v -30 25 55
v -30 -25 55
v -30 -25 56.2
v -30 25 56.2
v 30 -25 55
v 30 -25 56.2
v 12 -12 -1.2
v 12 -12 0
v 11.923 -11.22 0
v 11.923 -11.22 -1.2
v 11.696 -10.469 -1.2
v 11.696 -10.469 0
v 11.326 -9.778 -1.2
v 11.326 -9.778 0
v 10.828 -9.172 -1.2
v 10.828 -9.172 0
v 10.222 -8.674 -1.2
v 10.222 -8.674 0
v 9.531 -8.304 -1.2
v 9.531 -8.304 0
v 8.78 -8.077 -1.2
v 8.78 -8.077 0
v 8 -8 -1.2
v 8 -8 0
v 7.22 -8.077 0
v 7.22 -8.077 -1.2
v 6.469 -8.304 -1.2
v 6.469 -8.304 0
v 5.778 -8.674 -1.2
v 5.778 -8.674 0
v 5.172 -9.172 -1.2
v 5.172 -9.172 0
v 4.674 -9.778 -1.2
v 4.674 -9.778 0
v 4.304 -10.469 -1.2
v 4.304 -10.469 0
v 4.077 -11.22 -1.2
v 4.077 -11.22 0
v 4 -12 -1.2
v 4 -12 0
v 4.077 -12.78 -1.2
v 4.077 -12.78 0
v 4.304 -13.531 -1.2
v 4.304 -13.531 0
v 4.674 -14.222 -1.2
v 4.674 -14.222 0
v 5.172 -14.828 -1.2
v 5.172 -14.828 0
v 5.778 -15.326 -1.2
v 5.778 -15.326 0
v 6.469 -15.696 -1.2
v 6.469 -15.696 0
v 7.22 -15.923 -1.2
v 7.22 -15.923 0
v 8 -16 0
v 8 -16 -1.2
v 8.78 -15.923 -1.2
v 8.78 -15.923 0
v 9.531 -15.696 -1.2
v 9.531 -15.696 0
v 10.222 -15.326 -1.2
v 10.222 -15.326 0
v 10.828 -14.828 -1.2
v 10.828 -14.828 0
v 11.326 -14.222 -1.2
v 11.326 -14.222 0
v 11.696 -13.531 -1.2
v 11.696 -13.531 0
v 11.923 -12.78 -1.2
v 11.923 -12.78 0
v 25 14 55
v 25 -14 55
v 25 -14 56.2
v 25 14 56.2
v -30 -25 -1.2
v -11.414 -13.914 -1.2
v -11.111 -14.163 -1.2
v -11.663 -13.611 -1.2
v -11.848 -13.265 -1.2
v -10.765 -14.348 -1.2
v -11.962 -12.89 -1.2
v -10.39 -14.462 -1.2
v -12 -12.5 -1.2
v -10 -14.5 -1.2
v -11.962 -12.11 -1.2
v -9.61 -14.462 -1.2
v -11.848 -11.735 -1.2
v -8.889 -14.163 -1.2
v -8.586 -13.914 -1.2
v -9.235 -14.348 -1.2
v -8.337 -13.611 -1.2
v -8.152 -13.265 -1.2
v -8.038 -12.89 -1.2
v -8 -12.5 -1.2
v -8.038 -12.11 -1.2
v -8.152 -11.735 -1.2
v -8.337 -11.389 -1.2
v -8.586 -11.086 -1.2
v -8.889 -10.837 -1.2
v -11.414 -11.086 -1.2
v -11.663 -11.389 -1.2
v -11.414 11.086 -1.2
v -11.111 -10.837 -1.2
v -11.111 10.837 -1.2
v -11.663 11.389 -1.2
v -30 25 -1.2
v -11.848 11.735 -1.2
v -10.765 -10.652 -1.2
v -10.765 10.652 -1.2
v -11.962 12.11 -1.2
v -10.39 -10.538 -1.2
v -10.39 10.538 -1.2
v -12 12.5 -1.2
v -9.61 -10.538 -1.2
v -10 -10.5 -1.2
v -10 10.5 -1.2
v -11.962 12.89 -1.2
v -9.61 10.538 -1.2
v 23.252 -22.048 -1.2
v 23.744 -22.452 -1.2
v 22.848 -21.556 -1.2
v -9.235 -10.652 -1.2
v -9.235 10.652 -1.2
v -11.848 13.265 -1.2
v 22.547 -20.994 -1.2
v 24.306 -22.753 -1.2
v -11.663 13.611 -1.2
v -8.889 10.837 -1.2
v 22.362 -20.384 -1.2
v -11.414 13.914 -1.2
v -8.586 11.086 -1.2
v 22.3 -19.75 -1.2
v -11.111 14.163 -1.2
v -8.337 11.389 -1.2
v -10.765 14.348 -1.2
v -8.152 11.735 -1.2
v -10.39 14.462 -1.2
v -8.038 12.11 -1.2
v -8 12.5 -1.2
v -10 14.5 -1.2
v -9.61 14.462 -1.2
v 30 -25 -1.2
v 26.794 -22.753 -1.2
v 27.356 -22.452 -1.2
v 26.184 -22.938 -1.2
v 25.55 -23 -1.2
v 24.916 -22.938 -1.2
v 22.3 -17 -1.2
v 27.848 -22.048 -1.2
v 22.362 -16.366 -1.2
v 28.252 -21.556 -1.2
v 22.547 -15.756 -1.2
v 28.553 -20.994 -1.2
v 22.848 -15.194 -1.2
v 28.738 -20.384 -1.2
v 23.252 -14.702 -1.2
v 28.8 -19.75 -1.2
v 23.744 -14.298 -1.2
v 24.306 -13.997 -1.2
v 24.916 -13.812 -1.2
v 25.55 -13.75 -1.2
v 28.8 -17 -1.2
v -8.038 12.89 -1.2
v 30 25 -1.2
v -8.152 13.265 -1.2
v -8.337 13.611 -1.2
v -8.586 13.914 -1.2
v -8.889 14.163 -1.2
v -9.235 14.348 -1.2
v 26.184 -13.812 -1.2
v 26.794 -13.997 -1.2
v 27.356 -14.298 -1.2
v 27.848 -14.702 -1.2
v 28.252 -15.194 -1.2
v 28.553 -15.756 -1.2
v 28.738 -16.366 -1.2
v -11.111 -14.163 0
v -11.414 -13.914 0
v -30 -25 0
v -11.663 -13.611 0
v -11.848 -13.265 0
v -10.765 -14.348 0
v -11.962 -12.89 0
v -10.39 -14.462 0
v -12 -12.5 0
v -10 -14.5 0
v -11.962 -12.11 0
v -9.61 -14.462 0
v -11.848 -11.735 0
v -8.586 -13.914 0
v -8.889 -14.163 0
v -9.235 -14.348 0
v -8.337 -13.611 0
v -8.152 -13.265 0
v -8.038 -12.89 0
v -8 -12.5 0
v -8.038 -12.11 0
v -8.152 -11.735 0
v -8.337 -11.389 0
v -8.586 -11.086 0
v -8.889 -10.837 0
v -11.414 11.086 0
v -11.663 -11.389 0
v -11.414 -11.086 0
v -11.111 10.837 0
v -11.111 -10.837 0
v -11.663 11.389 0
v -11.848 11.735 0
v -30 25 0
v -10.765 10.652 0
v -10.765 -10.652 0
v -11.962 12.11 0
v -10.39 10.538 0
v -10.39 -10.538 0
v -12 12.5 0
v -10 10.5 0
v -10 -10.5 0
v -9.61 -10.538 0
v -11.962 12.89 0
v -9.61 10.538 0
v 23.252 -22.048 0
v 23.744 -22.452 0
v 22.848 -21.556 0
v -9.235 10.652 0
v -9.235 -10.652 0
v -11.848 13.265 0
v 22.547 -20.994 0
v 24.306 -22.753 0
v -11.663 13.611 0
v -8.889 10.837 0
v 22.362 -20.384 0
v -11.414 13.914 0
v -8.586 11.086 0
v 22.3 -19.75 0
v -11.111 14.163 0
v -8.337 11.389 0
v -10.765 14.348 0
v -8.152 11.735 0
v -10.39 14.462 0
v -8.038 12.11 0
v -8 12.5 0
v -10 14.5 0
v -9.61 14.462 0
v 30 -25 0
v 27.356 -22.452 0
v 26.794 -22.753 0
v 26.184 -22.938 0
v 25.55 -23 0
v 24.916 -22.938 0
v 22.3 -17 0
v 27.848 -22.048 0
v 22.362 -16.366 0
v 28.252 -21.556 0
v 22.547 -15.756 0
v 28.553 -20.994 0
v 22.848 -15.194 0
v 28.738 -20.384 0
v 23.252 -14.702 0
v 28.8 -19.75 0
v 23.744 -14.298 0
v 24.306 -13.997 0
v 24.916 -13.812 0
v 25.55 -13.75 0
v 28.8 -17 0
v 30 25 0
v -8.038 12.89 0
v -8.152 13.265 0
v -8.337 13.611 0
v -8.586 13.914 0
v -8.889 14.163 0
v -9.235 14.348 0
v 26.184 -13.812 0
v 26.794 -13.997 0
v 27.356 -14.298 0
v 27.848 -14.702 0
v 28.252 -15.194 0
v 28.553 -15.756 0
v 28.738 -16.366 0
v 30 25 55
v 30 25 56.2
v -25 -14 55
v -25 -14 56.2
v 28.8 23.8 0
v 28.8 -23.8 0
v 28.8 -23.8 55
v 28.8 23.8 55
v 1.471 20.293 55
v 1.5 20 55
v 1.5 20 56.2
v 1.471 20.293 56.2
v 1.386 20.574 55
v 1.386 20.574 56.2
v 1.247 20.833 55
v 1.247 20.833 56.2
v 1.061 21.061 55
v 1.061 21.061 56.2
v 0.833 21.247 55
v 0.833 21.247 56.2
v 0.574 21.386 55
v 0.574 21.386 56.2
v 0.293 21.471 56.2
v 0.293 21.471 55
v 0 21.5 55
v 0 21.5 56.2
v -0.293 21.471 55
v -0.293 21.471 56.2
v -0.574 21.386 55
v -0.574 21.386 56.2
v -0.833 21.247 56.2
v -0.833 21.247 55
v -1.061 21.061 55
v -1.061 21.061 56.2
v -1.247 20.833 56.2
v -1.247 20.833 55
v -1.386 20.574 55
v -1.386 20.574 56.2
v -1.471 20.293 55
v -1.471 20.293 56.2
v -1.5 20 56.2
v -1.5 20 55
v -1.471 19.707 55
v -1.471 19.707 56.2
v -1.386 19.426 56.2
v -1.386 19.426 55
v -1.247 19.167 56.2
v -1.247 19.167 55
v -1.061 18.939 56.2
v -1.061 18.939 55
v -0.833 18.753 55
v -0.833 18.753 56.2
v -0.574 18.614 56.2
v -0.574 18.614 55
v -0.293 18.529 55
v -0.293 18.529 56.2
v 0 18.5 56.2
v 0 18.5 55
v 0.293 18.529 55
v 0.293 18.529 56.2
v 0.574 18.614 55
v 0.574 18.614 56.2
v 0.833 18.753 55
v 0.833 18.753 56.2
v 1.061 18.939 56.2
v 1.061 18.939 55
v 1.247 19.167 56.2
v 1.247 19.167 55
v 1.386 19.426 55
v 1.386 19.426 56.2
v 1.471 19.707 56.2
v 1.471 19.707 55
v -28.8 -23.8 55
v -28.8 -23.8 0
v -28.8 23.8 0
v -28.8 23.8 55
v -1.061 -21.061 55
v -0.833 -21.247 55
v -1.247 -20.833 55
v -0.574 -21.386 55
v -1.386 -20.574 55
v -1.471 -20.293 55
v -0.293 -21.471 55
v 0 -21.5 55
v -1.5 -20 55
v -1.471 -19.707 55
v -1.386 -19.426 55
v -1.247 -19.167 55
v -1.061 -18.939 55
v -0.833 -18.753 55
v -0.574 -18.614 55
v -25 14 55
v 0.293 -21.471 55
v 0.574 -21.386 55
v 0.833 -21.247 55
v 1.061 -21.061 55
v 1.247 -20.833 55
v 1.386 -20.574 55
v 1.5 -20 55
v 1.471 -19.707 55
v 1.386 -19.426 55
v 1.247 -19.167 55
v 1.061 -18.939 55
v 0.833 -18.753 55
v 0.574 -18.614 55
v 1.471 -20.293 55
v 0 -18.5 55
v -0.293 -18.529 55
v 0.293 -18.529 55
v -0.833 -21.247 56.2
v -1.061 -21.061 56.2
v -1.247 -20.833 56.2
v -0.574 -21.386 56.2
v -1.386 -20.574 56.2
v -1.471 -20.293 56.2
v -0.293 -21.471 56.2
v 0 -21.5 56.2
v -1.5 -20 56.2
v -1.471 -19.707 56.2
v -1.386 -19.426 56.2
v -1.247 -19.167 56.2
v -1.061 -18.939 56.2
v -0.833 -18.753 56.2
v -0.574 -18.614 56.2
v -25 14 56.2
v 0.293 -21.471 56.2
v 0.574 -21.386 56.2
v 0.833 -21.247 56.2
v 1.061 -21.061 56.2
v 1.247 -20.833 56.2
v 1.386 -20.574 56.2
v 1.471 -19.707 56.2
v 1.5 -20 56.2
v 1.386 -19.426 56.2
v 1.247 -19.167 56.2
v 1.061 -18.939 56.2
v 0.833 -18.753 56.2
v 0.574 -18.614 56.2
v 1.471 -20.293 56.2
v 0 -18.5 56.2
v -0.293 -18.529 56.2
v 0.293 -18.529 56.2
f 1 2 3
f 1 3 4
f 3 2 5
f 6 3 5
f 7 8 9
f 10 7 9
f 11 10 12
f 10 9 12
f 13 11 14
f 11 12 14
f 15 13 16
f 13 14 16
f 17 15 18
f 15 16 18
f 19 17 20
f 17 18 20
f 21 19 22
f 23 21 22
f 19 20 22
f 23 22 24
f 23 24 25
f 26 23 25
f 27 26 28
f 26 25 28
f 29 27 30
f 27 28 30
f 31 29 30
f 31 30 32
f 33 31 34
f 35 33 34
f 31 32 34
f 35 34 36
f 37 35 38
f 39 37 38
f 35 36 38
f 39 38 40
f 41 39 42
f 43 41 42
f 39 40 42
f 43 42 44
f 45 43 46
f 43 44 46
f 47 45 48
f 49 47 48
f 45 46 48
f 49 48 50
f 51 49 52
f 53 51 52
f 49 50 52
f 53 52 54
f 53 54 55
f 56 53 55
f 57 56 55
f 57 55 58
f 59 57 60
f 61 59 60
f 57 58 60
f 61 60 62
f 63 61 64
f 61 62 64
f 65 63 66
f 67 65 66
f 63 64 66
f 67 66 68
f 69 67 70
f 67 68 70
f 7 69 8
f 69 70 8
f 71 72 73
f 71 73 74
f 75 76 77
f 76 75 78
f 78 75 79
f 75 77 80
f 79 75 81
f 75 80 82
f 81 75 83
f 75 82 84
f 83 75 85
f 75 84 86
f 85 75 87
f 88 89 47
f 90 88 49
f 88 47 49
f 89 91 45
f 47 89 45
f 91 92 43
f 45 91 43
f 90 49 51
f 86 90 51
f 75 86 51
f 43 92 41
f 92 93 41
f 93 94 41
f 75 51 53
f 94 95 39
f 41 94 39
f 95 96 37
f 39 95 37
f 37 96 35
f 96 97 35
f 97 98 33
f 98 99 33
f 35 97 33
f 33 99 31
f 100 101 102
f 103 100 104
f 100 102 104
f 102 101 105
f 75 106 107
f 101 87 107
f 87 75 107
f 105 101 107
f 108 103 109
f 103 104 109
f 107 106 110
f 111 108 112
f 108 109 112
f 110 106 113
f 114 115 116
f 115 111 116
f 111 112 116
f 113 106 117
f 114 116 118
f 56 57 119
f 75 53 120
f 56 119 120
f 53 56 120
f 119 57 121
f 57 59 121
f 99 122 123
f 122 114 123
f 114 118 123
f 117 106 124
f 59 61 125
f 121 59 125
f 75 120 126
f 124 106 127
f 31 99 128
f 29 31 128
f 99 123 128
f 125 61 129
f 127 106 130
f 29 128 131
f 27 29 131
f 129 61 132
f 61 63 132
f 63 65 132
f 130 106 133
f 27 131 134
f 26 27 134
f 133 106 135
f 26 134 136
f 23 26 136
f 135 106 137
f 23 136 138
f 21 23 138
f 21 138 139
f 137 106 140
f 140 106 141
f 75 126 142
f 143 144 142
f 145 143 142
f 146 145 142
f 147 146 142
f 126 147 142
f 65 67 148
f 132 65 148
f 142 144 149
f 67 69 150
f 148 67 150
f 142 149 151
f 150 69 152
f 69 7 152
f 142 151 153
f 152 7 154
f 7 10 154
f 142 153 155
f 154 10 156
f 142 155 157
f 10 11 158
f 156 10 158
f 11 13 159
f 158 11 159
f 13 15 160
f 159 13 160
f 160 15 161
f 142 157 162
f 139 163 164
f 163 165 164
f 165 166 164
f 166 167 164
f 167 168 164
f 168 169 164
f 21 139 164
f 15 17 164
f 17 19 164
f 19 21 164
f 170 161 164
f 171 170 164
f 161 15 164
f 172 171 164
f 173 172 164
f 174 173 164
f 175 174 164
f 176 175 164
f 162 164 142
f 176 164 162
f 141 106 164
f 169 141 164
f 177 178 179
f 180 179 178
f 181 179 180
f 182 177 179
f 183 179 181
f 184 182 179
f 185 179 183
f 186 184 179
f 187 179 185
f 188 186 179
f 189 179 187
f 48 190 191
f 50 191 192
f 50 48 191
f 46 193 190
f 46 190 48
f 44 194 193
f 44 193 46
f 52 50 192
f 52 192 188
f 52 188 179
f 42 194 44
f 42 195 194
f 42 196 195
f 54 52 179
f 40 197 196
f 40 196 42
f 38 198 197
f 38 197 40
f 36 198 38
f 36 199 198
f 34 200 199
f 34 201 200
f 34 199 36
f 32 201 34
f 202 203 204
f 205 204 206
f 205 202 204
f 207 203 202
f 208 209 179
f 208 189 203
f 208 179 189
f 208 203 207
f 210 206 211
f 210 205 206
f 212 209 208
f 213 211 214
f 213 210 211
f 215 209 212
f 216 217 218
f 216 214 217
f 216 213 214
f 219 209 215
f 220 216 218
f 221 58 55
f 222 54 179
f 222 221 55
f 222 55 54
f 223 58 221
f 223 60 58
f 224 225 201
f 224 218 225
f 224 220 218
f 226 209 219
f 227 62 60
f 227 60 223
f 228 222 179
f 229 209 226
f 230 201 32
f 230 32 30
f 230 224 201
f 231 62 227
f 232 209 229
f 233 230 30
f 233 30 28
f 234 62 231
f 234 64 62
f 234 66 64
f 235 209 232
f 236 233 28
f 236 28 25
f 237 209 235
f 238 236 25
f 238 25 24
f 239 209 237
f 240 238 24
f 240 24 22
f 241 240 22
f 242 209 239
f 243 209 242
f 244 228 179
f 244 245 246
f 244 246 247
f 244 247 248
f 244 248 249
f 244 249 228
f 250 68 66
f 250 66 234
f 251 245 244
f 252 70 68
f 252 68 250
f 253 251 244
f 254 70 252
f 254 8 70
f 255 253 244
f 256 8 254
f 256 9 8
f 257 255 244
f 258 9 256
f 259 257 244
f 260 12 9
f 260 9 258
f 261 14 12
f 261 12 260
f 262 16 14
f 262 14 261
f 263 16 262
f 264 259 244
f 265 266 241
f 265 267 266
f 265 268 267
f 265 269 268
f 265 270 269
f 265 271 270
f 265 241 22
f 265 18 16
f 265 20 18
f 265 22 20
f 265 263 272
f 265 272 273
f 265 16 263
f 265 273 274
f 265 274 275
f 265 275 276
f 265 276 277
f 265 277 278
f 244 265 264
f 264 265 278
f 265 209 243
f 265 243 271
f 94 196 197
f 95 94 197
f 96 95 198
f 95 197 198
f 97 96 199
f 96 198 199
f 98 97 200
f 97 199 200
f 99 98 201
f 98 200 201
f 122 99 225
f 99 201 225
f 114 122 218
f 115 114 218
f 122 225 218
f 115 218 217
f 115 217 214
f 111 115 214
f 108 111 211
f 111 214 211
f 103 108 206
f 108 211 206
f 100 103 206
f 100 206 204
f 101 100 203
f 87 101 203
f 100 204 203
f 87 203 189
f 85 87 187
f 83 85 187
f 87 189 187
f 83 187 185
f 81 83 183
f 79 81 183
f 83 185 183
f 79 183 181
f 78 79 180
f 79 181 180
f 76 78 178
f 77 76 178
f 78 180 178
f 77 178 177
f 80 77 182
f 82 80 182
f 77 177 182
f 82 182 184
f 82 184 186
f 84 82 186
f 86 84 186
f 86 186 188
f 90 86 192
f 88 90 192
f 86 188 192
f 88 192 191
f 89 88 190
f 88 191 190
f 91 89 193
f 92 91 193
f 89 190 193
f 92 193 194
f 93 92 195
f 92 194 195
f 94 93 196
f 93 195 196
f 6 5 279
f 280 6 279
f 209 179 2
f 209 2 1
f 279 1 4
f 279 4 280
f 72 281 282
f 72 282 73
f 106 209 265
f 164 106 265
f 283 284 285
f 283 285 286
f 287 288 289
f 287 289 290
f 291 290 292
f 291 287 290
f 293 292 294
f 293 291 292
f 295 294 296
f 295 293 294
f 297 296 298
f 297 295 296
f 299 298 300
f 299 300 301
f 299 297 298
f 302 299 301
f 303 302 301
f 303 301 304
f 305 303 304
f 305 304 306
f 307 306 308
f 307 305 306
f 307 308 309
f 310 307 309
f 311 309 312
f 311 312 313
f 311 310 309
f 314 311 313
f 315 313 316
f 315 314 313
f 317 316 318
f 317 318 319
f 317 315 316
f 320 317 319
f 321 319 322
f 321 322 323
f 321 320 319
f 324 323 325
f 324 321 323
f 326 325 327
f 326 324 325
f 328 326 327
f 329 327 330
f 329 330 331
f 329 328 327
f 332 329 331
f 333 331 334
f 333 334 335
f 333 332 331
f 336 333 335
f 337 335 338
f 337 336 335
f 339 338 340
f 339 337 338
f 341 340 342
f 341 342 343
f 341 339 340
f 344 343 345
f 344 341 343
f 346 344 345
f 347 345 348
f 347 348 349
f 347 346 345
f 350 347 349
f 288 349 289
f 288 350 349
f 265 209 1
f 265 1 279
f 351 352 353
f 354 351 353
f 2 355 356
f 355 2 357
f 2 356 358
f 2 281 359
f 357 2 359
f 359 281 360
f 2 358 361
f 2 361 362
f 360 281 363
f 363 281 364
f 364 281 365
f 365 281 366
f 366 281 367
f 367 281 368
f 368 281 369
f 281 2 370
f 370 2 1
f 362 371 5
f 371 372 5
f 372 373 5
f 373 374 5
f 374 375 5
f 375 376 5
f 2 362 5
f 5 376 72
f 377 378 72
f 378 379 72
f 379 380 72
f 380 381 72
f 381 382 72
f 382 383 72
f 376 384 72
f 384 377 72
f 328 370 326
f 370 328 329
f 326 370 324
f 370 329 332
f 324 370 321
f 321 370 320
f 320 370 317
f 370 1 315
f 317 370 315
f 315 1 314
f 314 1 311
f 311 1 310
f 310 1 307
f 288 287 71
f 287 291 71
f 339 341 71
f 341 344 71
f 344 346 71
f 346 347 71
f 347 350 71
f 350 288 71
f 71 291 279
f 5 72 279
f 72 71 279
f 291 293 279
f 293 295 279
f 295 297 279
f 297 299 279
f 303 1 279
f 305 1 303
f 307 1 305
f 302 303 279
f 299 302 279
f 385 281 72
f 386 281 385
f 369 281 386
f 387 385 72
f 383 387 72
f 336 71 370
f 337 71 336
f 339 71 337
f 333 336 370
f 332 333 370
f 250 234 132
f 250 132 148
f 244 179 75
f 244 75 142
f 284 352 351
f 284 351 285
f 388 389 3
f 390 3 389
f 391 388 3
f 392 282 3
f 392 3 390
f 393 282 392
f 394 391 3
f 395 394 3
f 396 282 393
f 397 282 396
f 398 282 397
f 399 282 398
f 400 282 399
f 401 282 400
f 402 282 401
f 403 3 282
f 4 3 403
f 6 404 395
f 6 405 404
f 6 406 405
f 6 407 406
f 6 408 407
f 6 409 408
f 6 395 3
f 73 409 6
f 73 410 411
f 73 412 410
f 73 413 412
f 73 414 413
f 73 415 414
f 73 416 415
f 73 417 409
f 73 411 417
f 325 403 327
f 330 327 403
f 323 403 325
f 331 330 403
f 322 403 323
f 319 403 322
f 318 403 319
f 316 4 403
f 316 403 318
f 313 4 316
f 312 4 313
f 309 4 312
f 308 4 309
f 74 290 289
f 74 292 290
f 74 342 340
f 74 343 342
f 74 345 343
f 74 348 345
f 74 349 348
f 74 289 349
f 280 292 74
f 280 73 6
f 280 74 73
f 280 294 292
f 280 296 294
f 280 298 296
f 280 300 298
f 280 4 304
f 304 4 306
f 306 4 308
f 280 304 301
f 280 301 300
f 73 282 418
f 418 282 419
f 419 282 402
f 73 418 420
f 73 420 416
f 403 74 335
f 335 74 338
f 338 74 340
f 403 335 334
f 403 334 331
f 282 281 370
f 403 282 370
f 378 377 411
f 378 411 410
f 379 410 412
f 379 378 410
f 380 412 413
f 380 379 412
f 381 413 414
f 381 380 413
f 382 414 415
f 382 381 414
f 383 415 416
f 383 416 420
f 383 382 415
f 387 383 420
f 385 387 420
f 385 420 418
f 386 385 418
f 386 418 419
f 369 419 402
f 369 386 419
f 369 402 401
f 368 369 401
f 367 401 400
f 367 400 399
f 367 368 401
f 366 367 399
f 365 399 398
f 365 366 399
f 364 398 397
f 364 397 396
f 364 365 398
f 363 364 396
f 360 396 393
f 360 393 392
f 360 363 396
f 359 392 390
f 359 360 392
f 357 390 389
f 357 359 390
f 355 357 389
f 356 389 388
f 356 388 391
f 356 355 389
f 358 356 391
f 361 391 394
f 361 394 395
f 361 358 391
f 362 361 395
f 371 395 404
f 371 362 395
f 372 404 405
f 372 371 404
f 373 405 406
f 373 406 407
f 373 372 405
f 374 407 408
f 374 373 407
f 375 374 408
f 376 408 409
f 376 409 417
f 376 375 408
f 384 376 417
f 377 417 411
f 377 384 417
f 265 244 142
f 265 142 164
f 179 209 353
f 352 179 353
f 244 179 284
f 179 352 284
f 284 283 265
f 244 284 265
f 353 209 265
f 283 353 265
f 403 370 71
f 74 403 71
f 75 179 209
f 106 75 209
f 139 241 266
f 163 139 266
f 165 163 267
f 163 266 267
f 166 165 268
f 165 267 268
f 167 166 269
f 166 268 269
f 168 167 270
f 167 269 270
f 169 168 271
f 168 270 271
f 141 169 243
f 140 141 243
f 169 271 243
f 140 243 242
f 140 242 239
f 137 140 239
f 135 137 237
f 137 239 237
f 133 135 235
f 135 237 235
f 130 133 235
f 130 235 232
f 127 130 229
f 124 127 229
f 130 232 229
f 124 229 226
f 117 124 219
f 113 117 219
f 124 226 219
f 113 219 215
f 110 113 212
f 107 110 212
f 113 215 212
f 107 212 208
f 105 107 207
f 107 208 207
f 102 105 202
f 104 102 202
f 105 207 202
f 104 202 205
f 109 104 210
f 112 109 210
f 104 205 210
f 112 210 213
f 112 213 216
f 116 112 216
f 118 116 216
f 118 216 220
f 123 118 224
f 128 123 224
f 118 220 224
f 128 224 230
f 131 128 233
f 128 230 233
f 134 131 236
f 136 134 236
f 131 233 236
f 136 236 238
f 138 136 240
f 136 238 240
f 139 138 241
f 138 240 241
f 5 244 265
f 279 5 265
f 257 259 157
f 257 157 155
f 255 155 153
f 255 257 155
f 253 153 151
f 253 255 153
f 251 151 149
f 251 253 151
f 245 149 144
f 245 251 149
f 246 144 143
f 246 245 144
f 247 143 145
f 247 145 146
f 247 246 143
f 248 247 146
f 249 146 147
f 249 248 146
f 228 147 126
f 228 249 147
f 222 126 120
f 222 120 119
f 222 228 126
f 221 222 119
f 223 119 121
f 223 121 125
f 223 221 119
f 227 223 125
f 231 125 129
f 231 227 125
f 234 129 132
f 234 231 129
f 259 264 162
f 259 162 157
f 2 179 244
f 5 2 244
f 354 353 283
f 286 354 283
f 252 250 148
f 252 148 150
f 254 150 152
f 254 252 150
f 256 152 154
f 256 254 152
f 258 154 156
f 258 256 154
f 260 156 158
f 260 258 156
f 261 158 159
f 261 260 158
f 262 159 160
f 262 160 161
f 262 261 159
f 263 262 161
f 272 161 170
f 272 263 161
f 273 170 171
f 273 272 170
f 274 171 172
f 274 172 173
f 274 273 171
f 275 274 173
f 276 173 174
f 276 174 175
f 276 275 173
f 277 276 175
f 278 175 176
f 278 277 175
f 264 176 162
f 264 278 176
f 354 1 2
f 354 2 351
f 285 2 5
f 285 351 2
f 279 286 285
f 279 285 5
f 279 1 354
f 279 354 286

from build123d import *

# Parameters (mm, degrees)
F0_W     = 60
F0_H     = 50
F0_W_2   = 57.6
F0_H_2   = 47.6
F1_DEPTH = 55
F2_W     = 60
F2_H     = 50
F2_R     = 1.5
F2_W_2   = 50
F2_H_2   = 28
F3_DEPTH = 1.2
F4_W     = 60
F4_H     = 50
F4_R     = 2
F4_R_2   = 4
F5_DEPTH = 1.2


with BuildPart() as f1:
    # F0 (on Top) → F1 (new body)
    with BuildSketch(Plane.XY):
        Rectangle(F0_W, F0_H)
        Rectangle(F0_W_2, F0_H_2, mode=Mode.SUBTRACT)
    extrude(amount=F1_DEPTH)


with BuildPart() as f3:
    # F2 (on face) → F3 (new body)
    with BuildSketch(Plane.XY.offset(55)):
        Rectangle(F2_W, F2_H)
        with Locations((0, -20)):
            Circle(F2_R, mode=Mode.SUBTRACT)
        Rectangle(F2_W_2, F2_H_2, mode=Mode.SUBTRACT)
        with Locations((0, 20)):
            Circle(F2_R, mode=Mode.SUBTRACT)
    extrude(amount=F3_DEPTH)


with BuildPart() as f5:
    # F4 (on Top) → F5 (new body)
    with BuildSketch(Plane.XY):
        Rectangle(F4_W, F4_H)
        with Locations((-10, -12.5)):
            Circle(F4_R, mode=Mode.SUBTRACT)
        with BuildLine():
            Line((28.8, -17), (28.8, -19.75))
            ThreePointArc((28.8, -19.75), (25.55, -23), (22.3, -19.75))
            Line((22.3, -19.75), (22.3, -17))
            ThreePointArc((22.3, -17), (25.55, -13.75), (28.8, -17))
        make_face(mode=Mode.SUBTRACT)
        with Locations((8, -12)):
            Circle(F4_R_2, mode=Mode.SUBTRACT)
        with Locations((-10, 12.5)):
            Circle(F4_R, mode=Mode.SUBTRACT)
    extrude(amount=-F5_DEPTH)


solid = Compound([f1.part, f3.part, f5.part])
